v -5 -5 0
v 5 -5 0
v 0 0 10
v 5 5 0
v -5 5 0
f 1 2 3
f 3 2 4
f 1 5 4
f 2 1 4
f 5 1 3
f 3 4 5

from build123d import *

# Parameters (mm, degrees)
F0_W      = 10
F0_H      = 10
F7_DEPTH  = 10
F8_DEPTH  = 4.473135955
F9_DEPTH  = 4.473135955
F12_W     = 19.2976649851
F12_H     = 18.8721097074
F13_DEPTH = 4.473135955
F14_W     = 48.2514444739
F14_H     = 43.6994209886
F15_DEPTH = 4.473135955


with BuildPart() as f7:
    # F0 (on Top) → F7 (new body)
    with BuildSketch(Plane.XY):
        Rectangle(F0_W, F0_H)
    extrude(amount=F7_DEPTH)

    # F4 (on 3pt) → F8 (cut, through all)
    with BuildSketch(Plane(origin=(4, 0, 2), x_dir=(0, 1, 0), z_dir=(0.894427191, 0, 0.4472135955))):
        Polygon((0, 8.94427191), (-5, -2.2360679775), (5, -2.2360679775), align=None)
    extrude(amount=F8_DEPTH, mode=Mode.SUBTRACT)

    # F6 (on 3pt) → F9 (cut, through all)
    with BuildSketch(Plane(origin=(-4, 0, 2), x_dir=(0, 1, 0), z_dir=(0.894427191, 0, -0.4472135955))):
        Polygon((-5, -2.2360679775), (5, -2.2360679775), (0, 8.94427191), align=None)
    extrude(amount=-F9_DEPTH, mode=Mode.SUBTRACT)

    # F12 (on 3pt) → F13 (cut, through all)
    with BuildSketch(Plane(origin=(0, -4, 2), x_dir=(-1, 0, 0), z_dir=(0, 0.894427191, -0.4472135955))):
        with Locations((0.6115389988, 1.8165449146)):
            Rectangle(F12_W, F12_H)
    extrude(amount=-F13_DEPTH, mode=Mode.SUBTRACT)

    # F14 (on 3pt) → F15 (cut, through all)
    with BuildSketch(Plane(origin=(0, 4, 2), x_dir=(-1, 0, 0), z_dir=(0, 0.894427191, 0.4472135955))):
        with Locations((-1.8208147958, 2.8563160449)):
            Rectangle(F14_W, F14_H)
    extrude(amount=F15_DEPTH, mode=Mode.SUBTRACT)


solid = f7.part
